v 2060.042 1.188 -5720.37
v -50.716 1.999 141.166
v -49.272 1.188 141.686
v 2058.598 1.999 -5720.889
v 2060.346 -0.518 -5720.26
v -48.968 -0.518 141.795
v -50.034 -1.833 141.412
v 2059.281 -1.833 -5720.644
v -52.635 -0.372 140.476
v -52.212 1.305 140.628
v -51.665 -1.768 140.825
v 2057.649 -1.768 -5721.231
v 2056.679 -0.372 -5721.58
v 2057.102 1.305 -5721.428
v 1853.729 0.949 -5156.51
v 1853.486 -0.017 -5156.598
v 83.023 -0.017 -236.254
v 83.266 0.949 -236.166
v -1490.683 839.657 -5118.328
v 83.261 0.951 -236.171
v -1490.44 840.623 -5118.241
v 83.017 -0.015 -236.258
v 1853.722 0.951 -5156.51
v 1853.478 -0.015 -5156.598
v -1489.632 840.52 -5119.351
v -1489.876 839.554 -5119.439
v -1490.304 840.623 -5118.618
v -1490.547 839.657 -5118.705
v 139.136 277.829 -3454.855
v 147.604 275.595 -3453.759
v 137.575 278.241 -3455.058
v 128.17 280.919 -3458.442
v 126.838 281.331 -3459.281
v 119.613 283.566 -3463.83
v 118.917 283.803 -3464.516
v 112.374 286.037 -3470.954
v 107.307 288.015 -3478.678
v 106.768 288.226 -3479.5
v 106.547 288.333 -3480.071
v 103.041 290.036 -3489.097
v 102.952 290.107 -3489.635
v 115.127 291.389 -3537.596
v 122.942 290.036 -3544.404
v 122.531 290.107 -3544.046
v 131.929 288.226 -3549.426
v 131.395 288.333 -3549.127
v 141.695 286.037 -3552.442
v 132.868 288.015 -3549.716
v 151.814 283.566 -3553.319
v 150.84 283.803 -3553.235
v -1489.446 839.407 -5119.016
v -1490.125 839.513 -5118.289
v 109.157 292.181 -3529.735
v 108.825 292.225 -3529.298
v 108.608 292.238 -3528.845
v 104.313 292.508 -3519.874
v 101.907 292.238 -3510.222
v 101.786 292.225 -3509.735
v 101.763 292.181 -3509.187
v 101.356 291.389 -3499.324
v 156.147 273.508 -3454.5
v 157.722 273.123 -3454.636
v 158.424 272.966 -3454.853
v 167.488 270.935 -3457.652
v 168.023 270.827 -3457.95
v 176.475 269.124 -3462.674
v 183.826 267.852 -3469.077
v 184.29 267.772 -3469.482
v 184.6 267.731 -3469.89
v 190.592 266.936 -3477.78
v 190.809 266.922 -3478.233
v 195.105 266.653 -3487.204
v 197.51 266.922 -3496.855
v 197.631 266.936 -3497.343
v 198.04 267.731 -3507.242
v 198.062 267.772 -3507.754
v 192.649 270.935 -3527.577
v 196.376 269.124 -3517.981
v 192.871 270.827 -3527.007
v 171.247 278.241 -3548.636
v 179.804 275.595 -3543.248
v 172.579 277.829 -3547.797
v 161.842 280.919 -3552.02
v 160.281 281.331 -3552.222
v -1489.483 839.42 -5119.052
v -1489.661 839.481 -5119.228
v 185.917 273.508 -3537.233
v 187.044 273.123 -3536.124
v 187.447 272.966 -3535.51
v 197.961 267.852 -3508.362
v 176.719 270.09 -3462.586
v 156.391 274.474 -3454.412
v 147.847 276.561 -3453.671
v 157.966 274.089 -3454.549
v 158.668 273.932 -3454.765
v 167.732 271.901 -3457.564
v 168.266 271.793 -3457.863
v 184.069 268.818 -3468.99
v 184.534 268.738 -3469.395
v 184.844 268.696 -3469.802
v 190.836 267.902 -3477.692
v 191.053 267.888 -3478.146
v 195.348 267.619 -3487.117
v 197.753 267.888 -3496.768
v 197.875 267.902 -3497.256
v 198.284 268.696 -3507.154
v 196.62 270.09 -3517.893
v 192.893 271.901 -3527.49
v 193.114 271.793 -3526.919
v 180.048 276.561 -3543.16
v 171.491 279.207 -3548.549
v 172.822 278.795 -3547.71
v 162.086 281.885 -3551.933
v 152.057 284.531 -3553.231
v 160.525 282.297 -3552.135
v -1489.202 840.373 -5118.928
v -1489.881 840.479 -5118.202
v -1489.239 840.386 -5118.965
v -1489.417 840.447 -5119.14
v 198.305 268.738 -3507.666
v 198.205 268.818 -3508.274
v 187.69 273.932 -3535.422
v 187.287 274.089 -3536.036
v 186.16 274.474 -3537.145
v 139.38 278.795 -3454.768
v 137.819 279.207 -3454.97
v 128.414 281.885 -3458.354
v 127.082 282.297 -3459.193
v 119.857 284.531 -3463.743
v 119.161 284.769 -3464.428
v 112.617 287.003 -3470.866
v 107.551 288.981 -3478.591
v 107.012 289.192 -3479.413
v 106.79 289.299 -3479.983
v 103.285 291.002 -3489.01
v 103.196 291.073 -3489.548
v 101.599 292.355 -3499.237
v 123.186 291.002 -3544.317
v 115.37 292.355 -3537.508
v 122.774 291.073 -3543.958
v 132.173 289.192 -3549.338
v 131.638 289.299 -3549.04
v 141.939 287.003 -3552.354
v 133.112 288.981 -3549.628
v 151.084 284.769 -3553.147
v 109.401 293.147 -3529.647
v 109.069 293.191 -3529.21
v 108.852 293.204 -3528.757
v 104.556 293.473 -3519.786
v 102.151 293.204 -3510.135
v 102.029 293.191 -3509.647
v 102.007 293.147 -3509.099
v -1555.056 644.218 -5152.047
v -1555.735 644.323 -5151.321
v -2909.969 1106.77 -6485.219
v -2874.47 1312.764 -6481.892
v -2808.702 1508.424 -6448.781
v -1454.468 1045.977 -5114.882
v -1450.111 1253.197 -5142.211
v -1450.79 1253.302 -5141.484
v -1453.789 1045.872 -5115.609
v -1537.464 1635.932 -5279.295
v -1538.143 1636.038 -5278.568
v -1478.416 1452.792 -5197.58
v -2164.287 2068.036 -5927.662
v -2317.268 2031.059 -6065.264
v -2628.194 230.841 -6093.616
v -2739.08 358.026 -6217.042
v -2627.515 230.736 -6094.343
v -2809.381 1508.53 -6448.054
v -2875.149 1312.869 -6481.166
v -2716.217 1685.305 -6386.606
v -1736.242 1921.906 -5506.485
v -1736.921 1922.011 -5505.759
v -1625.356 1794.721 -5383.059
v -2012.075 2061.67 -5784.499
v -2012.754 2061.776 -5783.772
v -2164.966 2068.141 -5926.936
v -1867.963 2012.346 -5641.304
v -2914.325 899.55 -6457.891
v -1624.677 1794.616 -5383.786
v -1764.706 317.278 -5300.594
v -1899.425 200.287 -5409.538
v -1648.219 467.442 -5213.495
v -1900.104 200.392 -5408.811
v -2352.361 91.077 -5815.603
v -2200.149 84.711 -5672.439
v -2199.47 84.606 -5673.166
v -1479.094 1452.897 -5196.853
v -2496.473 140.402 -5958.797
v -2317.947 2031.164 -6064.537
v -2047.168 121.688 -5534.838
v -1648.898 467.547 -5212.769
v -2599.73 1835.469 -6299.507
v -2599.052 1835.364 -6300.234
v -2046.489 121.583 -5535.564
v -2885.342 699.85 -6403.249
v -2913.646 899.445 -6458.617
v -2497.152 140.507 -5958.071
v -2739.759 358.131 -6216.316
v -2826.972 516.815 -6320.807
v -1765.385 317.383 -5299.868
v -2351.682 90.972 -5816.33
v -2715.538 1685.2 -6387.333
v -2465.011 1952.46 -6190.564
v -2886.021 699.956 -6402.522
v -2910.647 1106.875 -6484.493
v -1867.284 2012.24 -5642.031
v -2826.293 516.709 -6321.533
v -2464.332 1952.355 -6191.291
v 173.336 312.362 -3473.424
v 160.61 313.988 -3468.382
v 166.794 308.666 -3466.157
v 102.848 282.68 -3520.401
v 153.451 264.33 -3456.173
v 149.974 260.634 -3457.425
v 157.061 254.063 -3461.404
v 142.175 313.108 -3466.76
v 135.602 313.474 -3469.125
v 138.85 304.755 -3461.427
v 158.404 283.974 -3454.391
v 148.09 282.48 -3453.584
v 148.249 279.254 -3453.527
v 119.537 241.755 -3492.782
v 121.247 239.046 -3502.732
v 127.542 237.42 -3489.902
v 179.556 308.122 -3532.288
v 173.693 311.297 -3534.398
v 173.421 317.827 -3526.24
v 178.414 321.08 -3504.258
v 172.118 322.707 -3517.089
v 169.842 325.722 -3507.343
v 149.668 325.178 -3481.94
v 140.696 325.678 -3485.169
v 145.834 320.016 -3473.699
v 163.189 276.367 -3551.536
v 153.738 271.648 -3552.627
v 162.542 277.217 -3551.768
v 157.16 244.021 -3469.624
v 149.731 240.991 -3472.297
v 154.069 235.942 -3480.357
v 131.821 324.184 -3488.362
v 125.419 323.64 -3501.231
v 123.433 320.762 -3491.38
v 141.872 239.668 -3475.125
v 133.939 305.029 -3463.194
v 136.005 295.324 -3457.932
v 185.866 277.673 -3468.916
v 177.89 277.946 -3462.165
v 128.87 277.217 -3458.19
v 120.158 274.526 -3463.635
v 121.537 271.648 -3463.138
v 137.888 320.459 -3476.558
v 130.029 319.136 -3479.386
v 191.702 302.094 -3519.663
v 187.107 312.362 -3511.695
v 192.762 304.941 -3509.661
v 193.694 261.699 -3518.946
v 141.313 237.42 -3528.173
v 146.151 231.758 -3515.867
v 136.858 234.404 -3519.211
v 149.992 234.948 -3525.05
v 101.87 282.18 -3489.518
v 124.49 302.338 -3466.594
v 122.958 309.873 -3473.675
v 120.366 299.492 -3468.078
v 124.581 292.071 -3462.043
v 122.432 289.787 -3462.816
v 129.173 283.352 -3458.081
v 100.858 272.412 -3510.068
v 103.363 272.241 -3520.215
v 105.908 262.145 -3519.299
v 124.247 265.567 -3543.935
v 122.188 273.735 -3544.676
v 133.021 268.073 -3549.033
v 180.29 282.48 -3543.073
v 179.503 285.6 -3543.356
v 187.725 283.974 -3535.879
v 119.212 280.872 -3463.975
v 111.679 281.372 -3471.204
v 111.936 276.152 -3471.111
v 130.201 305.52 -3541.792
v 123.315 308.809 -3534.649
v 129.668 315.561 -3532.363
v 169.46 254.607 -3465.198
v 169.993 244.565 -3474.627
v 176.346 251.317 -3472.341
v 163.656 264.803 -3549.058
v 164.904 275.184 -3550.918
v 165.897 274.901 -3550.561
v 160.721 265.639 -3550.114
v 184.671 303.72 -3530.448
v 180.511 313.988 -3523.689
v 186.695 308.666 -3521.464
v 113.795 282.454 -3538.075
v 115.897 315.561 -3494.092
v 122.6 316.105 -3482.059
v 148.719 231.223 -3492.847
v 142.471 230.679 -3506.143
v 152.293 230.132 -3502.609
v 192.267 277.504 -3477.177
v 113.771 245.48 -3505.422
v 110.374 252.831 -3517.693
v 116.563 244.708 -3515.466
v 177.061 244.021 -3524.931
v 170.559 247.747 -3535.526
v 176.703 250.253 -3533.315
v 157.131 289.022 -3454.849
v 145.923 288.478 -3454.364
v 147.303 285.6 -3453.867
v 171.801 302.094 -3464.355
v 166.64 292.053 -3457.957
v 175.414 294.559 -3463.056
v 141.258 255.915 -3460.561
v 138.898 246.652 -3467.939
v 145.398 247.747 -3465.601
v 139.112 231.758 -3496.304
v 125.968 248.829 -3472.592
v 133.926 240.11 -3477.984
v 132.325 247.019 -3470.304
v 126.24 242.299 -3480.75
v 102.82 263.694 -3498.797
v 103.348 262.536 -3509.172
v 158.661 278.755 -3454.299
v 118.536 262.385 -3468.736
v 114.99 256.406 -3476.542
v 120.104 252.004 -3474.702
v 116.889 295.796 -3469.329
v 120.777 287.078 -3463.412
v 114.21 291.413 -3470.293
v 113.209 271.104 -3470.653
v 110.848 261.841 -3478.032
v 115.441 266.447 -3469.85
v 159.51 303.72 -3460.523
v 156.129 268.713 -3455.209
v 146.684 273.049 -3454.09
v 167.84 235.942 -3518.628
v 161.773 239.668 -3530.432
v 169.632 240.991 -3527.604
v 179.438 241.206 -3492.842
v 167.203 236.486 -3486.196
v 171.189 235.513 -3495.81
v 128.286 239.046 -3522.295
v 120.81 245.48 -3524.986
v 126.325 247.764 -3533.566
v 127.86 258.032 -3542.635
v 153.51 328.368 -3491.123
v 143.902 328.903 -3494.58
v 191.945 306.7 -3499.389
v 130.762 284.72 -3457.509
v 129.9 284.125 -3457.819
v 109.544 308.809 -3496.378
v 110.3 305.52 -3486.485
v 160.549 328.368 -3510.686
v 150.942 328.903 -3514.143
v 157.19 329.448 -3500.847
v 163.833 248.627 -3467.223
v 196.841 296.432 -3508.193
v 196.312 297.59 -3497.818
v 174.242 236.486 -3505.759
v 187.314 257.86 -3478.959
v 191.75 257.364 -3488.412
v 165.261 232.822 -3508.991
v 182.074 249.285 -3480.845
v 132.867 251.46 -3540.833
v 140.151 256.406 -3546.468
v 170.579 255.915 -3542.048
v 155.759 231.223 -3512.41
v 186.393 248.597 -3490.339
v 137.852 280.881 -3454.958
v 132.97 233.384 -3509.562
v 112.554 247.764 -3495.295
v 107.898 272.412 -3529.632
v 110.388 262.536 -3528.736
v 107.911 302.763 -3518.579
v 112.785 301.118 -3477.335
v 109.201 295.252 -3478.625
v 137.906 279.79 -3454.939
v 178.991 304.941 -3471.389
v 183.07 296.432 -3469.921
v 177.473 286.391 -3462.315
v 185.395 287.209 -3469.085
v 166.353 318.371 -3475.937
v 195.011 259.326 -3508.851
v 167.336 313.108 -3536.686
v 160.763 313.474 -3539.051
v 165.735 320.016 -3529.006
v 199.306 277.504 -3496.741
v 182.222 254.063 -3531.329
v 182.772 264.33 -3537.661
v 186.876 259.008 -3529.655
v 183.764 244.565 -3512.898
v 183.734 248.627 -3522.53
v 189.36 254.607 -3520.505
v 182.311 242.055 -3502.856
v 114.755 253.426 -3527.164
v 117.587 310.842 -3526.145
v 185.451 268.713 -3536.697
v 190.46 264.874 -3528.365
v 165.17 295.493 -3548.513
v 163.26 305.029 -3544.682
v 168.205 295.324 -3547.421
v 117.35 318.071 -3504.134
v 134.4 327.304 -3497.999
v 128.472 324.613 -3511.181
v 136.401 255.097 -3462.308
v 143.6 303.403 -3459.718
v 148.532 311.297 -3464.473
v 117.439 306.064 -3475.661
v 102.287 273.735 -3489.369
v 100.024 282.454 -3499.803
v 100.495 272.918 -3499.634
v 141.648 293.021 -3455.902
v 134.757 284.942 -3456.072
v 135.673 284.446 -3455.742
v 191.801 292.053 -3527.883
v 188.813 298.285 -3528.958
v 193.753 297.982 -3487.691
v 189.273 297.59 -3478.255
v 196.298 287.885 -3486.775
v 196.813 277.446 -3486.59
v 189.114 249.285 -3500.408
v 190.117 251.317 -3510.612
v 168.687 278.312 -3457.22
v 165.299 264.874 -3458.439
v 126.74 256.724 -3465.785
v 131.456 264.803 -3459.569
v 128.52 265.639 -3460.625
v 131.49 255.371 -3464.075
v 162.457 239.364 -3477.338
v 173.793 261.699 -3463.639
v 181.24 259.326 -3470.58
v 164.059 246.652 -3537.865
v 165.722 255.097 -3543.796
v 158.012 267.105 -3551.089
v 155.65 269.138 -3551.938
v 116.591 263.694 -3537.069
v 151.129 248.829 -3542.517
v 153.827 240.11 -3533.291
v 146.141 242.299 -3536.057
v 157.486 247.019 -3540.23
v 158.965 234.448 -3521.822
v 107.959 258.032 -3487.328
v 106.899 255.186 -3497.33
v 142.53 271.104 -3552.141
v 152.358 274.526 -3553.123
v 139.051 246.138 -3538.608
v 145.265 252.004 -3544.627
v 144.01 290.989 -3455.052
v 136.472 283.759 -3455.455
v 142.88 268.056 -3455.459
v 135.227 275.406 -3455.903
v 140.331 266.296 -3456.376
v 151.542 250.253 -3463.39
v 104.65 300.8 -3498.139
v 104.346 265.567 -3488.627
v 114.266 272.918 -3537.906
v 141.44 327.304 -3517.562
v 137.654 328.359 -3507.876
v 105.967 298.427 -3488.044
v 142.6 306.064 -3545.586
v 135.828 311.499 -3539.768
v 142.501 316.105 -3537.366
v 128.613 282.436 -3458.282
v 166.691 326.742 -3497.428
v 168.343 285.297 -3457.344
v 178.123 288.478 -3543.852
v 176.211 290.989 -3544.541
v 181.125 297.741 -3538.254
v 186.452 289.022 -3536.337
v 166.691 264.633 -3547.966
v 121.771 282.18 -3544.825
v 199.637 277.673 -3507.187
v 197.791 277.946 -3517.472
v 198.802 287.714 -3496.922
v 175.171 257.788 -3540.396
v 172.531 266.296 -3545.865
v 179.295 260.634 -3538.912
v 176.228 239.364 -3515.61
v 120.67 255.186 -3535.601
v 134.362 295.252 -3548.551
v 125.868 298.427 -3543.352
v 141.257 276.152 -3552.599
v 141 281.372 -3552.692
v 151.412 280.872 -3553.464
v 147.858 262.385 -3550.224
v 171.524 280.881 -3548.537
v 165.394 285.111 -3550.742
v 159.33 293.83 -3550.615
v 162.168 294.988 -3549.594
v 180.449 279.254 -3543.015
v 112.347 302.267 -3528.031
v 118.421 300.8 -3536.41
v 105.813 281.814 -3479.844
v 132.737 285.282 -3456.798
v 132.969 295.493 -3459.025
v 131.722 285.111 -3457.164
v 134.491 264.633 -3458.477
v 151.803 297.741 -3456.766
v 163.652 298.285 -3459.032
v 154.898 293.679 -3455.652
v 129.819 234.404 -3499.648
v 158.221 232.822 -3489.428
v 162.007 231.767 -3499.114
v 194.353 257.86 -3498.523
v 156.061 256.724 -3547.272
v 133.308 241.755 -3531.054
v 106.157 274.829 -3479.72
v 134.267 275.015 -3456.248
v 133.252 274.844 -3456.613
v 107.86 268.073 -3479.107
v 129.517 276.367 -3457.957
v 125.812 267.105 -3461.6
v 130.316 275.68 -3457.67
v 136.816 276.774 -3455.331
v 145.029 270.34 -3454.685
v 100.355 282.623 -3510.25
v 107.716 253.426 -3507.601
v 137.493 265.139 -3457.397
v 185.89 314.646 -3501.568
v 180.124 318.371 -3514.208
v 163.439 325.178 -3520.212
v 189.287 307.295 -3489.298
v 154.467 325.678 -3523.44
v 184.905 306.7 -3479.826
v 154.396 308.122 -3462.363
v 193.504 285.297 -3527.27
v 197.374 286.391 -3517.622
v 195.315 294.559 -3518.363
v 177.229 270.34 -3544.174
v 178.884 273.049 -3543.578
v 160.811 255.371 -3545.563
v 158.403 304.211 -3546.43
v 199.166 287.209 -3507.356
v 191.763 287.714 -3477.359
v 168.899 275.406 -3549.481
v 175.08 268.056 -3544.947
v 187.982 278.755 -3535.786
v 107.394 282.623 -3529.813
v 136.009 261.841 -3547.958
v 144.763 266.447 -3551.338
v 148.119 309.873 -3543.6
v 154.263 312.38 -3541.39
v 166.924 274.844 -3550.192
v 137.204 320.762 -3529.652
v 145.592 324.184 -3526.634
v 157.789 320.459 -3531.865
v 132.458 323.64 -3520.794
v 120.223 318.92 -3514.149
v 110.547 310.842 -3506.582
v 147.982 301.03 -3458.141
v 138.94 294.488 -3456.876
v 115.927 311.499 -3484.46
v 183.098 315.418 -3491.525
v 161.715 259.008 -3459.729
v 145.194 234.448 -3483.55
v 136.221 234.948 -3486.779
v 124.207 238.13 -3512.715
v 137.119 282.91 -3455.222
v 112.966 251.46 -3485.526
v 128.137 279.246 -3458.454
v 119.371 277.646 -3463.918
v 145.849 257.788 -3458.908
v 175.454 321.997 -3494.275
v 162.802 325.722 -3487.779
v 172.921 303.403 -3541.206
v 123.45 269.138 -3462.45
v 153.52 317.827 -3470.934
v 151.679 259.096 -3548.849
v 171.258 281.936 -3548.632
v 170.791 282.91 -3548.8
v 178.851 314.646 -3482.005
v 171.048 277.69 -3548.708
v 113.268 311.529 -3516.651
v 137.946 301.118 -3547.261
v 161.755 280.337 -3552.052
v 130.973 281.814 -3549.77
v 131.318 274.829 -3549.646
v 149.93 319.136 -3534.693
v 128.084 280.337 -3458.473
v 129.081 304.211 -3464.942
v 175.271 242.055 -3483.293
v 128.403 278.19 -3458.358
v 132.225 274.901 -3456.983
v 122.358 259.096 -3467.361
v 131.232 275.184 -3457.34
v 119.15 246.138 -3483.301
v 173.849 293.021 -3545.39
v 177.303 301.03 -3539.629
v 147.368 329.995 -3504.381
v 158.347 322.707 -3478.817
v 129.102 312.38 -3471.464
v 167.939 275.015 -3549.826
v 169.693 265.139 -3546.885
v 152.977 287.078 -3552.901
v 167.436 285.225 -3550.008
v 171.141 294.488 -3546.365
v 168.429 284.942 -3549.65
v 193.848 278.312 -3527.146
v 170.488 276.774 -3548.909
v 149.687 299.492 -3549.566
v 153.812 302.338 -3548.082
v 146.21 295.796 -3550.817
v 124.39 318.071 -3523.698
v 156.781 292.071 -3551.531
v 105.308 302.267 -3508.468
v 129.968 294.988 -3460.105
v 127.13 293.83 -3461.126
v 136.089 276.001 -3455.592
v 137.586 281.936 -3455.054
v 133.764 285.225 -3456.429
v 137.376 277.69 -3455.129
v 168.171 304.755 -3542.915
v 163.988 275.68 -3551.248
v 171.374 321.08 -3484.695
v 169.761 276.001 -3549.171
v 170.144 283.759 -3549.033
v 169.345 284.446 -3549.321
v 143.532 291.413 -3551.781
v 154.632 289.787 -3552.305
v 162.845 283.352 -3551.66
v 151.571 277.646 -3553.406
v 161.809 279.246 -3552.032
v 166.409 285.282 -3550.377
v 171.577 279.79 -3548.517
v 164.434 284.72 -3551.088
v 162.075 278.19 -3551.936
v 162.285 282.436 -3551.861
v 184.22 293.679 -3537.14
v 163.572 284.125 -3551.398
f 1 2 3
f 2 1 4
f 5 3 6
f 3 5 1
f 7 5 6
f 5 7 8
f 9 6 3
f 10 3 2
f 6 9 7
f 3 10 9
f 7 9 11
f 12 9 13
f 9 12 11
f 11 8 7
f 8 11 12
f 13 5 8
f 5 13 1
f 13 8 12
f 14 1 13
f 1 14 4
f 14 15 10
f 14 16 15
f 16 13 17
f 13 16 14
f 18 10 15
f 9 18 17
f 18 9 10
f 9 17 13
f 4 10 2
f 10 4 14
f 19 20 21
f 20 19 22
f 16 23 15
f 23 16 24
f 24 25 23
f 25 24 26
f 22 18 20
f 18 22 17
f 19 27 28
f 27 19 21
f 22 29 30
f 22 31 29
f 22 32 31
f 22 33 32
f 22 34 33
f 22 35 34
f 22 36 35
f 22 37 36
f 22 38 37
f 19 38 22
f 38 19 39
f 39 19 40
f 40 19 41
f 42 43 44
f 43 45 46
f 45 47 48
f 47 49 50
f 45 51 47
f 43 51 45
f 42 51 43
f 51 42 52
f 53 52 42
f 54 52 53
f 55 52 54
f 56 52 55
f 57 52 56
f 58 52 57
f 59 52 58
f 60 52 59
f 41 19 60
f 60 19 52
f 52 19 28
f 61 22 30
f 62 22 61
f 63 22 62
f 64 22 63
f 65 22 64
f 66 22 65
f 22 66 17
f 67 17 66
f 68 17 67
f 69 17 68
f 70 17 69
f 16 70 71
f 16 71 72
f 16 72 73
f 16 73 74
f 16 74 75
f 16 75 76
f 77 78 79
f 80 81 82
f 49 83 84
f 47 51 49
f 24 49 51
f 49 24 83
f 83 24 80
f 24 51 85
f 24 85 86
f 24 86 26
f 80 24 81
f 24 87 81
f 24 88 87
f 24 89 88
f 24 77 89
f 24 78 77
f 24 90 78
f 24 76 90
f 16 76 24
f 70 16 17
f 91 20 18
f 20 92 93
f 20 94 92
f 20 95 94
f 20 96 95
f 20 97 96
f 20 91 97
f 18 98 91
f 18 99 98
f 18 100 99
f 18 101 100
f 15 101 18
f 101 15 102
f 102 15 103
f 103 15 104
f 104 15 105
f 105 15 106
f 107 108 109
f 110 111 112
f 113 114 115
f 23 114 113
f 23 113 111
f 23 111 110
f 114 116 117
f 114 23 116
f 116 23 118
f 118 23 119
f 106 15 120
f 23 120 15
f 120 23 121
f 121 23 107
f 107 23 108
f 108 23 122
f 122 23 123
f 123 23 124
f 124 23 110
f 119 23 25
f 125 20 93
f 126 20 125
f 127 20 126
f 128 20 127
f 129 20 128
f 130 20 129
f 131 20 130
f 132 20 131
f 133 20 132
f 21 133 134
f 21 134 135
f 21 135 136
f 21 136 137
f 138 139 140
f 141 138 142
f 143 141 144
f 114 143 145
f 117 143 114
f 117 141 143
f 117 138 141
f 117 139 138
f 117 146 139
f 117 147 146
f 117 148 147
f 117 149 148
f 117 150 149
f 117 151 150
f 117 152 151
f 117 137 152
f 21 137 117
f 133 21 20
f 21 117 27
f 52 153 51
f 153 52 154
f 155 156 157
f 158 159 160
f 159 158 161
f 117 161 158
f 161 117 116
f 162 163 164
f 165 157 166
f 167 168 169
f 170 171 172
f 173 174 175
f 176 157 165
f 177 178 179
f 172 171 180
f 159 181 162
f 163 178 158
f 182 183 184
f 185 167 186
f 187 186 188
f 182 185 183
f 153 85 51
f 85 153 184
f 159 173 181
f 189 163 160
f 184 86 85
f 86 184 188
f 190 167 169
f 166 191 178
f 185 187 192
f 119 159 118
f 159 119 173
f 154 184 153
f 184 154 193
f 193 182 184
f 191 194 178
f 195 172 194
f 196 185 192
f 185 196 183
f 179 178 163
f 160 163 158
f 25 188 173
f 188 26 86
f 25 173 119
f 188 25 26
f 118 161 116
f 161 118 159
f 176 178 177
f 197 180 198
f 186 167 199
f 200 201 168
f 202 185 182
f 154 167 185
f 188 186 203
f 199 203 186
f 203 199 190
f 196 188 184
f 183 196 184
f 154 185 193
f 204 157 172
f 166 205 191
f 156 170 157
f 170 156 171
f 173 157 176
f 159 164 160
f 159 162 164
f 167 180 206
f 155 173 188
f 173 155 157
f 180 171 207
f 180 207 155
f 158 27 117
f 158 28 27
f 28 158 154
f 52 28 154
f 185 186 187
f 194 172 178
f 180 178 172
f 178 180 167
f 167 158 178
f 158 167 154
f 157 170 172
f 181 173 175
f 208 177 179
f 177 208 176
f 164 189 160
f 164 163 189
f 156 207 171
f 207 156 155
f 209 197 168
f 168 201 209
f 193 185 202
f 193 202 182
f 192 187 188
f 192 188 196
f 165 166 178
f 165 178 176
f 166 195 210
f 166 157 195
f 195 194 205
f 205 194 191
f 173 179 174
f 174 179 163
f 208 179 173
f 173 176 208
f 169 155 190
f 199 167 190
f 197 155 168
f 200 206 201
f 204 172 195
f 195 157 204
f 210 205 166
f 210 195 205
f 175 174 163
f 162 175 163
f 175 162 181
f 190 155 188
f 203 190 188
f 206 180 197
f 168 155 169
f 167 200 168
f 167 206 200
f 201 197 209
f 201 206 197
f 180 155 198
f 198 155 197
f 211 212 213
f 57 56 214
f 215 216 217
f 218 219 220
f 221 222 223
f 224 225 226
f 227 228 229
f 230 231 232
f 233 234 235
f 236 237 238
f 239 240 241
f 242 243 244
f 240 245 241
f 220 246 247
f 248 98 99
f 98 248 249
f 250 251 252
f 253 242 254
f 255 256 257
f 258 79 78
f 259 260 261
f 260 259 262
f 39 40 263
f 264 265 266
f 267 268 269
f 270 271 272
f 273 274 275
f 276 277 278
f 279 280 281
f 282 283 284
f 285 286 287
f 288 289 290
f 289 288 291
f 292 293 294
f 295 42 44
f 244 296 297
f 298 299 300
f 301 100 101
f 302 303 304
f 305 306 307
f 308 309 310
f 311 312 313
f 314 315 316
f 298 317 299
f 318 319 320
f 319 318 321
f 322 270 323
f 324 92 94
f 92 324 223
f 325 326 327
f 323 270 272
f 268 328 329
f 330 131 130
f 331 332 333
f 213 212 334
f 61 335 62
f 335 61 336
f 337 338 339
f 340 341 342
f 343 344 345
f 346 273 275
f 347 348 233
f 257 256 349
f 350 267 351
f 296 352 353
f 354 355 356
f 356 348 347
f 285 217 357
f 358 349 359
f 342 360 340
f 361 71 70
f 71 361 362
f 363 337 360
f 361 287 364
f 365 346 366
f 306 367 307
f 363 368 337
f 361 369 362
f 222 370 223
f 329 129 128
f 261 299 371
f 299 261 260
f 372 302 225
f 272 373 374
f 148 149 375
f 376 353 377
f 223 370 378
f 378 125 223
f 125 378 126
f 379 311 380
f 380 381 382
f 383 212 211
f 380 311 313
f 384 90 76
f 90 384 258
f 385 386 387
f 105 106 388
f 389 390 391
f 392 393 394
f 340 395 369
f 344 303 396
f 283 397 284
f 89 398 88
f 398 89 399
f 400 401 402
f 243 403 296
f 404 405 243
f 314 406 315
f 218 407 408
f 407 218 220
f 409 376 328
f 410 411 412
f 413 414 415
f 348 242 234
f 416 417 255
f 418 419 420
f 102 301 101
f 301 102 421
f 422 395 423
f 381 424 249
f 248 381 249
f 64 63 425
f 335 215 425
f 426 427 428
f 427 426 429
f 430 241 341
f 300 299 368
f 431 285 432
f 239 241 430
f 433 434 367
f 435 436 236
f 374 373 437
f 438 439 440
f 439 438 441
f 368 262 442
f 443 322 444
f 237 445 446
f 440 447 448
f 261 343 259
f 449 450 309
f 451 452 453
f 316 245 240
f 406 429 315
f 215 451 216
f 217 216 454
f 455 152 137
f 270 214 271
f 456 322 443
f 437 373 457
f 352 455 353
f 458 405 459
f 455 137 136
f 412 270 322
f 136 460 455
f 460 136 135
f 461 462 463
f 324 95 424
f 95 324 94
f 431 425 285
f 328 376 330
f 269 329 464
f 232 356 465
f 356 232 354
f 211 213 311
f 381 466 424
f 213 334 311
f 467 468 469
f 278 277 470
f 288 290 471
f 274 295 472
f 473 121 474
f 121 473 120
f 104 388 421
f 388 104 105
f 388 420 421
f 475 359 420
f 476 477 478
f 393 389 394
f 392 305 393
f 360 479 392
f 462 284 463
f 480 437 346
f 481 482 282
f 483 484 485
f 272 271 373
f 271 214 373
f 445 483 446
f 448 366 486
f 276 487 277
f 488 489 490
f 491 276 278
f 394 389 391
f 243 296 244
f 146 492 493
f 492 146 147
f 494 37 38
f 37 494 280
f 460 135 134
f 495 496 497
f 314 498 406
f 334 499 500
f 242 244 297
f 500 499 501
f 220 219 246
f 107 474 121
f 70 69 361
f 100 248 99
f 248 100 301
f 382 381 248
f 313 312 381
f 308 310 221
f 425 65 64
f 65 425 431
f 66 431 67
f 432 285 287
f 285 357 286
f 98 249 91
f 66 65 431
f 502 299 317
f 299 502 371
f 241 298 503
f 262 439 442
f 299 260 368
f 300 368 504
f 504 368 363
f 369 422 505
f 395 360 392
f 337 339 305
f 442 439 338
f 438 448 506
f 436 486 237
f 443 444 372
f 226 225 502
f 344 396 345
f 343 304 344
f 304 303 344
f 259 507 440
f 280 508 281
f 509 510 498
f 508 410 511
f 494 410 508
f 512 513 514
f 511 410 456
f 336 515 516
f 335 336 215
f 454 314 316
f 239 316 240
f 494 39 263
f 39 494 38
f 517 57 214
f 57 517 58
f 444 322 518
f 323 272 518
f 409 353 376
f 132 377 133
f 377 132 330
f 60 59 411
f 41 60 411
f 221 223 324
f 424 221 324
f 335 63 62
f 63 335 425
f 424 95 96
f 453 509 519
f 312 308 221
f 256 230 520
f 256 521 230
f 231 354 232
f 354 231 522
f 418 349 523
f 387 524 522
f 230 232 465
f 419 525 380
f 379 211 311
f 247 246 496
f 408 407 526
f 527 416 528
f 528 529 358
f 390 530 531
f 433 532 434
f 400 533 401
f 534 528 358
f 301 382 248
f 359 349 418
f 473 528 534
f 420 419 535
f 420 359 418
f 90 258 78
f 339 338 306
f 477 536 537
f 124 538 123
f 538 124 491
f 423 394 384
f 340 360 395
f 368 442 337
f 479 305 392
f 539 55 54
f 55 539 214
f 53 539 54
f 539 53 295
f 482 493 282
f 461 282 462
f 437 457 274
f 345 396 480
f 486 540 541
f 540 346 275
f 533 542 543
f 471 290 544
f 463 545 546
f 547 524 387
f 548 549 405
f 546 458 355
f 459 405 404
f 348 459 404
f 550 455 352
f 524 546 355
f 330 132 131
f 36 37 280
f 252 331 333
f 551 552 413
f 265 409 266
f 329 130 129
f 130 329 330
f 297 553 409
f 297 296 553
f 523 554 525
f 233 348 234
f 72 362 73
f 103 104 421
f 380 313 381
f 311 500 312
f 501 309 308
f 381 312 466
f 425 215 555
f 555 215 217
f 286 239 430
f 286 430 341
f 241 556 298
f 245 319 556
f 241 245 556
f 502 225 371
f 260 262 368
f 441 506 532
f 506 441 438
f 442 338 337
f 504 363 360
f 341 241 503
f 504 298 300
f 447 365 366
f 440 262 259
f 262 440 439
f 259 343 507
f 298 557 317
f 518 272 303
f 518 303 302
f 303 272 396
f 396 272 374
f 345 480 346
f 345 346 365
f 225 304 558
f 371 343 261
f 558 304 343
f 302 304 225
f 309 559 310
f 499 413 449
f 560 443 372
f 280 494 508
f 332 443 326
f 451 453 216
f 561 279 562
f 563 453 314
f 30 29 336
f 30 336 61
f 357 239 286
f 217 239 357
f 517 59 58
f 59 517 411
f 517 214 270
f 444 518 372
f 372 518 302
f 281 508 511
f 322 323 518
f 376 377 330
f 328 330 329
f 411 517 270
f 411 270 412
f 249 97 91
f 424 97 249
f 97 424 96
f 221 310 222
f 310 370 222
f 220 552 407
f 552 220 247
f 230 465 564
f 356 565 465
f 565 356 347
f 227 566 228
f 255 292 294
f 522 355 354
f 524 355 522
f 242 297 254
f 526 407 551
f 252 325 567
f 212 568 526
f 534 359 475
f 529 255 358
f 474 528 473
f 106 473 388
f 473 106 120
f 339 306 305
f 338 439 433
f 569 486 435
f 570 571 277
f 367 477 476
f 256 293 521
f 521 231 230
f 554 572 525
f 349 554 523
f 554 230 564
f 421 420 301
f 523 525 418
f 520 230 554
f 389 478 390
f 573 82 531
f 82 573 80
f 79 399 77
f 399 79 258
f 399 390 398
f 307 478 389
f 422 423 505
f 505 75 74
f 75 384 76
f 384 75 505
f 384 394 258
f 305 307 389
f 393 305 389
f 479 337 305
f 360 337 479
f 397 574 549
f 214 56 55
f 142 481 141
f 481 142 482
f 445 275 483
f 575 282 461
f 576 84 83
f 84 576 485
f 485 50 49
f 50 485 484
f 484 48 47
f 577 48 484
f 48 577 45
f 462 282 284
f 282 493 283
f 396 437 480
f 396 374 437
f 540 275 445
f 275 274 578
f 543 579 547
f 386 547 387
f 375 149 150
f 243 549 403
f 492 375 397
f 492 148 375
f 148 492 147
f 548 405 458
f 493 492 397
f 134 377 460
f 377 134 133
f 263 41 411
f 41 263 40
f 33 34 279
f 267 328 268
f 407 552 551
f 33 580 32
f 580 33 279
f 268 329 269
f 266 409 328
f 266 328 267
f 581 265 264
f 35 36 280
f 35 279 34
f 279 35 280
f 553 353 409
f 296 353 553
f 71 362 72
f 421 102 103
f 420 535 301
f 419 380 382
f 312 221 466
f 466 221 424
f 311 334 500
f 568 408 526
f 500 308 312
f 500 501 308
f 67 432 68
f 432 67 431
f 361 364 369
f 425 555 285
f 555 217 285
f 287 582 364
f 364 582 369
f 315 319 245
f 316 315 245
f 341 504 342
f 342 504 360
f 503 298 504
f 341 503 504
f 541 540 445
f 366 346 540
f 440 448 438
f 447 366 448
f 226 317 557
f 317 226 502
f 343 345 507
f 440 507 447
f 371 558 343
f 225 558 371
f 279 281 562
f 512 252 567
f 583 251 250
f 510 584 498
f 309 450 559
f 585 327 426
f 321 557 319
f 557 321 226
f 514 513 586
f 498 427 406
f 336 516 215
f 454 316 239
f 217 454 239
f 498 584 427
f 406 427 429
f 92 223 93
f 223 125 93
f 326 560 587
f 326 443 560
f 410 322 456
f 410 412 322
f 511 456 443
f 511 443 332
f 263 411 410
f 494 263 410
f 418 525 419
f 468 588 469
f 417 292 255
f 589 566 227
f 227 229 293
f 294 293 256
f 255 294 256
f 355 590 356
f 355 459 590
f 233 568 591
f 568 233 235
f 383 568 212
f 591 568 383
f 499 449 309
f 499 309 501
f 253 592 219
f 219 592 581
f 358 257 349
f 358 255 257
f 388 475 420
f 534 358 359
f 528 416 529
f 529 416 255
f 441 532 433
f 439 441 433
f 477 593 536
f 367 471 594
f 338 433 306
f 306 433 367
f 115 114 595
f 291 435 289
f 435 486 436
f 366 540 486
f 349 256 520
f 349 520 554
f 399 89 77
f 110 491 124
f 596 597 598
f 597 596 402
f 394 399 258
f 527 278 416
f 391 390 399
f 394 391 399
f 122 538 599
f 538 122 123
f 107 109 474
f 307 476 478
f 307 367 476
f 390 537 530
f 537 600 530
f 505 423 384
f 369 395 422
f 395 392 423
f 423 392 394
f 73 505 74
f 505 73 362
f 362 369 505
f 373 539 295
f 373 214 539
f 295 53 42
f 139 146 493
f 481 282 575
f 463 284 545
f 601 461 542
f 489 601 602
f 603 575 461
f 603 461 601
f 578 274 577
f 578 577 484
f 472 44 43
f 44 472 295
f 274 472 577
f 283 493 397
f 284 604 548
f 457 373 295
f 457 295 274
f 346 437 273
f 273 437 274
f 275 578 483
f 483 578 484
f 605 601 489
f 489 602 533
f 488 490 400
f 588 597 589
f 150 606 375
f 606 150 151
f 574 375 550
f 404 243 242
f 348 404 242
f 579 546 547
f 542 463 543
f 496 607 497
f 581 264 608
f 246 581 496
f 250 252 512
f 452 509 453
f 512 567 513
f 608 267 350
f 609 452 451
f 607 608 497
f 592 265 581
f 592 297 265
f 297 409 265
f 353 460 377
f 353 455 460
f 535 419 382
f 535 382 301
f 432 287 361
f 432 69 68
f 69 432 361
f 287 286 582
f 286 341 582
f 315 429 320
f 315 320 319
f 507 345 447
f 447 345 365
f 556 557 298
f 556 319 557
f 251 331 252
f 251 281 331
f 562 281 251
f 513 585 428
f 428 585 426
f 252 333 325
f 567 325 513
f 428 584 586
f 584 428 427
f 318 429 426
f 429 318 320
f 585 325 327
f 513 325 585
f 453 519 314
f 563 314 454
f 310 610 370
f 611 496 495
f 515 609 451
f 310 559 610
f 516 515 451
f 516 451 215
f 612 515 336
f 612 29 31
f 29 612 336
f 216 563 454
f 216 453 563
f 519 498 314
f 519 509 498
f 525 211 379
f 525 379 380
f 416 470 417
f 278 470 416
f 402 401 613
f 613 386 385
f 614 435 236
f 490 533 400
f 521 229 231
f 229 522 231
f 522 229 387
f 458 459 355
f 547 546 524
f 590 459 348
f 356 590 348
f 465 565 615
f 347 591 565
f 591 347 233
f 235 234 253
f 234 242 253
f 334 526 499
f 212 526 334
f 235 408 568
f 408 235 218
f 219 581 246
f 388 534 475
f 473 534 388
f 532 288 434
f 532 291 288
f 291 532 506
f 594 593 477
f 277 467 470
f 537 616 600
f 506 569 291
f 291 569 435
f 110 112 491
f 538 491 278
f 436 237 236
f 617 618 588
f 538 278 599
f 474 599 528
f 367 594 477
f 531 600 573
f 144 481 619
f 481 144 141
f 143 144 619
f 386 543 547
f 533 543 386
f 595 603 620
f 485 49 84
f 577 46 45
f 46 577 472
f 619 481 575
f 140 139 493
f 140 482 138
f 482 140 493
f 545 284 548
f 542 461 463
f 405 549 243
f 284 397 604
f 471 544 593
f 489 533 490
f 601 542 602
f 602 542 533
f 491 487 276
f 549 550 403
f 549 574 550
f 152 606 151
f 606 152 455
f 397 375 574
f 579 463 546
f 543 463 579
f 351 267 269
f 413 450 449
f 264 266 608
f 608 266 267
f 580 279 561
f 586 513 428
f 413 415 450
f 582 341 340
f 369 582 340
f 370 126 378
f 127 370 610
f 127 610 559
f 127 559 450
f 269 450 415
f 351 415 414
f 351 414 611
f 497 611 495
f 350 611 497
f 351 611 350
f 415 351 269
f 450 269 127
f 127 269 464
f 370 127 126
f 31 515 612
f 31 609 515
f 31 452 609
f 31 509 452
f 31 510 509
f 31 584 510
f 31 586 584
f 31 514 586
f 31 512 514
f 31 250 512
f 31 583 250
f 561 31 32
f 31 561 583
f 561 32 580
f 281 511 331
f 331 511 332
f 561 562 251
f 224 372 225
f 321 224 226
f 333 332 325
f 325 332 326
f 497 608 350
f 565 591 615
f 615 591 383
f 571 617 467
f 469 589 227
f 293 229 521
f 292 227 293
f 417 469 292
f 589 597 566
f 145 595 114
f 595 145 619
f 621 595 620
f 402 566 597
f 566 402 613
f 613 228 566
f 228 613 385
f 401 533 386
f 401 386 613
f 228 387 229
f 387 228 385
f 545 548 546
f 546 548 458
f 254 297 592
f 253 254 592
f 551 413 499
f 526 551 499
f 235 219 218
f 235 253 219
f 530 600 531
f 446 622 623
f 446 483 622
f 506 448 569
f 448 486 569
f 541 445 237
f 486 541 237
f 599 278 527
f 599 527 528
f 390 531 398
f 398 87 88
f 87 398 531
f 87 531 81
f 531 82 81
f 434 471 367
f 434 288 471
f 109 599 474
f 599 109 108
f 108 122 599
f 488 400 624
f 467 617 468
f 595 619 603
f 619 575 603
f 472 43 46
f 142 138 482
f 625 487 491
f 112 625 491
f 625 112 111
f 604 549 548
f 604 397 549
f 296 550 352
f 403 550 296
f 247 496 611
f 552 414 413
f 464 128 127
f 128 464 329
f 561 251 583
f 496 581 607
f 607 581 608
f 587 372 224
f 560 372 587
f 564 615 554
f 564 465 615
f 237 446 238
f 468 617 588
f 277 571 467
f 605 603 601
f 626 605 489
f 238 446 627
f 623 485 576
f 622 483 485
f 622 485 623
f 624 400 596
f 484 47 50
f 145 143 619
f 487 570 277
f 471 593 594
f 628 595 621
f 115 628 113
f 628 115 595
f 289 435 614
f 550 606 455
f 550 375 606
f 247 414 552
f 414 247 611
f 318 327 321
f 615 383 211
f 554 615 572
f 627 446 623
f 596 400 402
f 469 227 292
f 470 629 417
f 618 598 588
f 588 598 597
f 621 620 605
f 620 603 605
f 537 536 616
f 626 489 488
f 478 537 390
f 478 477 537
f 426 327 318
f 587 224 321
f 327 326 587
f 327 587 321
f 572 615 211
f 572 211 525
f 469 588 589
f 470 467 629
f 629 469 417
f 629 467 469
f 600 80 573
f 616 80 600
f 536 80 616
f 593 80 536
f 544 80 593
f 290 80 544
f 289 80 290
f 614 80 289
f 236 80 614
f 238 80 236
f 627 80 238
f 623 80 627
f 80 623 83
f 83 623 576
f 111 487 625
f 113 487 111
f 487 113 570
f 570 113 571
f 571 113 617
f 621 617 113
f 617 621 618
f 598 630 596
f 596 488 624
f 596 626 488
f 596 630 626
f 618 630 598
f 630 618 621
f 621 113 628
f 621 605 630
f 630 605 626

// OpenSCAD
perShkat = 5230;
betta = 70.21;
nizhShkat = 3450;
mediGamma = 24;

aX = nizhShkat*sin(betta);
aZ = nizhShkat*cos(betta);
// echo( "aX = ", aX); // 3246
 echo( "aZ = ", aZ); //1168 
// Пузо 4%

cpX = aX/3;
cpZ = aZ/3 + perShkat/3;

//d1 = 500;

// echo("area = ", perShkat*aX/2 * (1/1000000)); // 8.5 кв м

// высота паруса
//echo (" h = " , perShkat * sin(betta)); // 4921


Genoa();

/* Упрощение!!! */


module Genoa() {
    
    rotate([ 0 , betta - 90 , 0 ])
    rotate([ 0 , 0 , -15 ])
    translate([ 0 , 0 , -perShkat-250  ])
    {

    translate([ 0 , 0 , -600 ])
    cylinder( h = perShkat + 1000 , d = 4 );

    hull() {

        //C 
        translate([ -1 , 0 , perShkat - 1 ])
        rotate([ 90 , 0 , 0 ])
        cylinder( h = 1, r = 1 , center=true );

        //B
        translate([ -1 , 0 , 1 ])
        rotate([ 90 , 0 , 0 ])
        cylinder( h = 1, r = 1 , center=true );

        //A
        translate([ 1 - aX , 0 , aZ ])
        rotate([ 90 , 0 , 0 ])
        cylinder( h = 1, r = 1 , center=true );

    }


    translate([ 1 - aX , 0 , aZ ])
    rotate([ 0 , -mediGamma , 0 ])
    translate([ -1000 , 0 , 0 ])
    cylinder( h = 1, r = 1000 , center=true );

    translate([ -cpX , 0 , cpZ ])
    sphere( r = 50 );
    }
}
